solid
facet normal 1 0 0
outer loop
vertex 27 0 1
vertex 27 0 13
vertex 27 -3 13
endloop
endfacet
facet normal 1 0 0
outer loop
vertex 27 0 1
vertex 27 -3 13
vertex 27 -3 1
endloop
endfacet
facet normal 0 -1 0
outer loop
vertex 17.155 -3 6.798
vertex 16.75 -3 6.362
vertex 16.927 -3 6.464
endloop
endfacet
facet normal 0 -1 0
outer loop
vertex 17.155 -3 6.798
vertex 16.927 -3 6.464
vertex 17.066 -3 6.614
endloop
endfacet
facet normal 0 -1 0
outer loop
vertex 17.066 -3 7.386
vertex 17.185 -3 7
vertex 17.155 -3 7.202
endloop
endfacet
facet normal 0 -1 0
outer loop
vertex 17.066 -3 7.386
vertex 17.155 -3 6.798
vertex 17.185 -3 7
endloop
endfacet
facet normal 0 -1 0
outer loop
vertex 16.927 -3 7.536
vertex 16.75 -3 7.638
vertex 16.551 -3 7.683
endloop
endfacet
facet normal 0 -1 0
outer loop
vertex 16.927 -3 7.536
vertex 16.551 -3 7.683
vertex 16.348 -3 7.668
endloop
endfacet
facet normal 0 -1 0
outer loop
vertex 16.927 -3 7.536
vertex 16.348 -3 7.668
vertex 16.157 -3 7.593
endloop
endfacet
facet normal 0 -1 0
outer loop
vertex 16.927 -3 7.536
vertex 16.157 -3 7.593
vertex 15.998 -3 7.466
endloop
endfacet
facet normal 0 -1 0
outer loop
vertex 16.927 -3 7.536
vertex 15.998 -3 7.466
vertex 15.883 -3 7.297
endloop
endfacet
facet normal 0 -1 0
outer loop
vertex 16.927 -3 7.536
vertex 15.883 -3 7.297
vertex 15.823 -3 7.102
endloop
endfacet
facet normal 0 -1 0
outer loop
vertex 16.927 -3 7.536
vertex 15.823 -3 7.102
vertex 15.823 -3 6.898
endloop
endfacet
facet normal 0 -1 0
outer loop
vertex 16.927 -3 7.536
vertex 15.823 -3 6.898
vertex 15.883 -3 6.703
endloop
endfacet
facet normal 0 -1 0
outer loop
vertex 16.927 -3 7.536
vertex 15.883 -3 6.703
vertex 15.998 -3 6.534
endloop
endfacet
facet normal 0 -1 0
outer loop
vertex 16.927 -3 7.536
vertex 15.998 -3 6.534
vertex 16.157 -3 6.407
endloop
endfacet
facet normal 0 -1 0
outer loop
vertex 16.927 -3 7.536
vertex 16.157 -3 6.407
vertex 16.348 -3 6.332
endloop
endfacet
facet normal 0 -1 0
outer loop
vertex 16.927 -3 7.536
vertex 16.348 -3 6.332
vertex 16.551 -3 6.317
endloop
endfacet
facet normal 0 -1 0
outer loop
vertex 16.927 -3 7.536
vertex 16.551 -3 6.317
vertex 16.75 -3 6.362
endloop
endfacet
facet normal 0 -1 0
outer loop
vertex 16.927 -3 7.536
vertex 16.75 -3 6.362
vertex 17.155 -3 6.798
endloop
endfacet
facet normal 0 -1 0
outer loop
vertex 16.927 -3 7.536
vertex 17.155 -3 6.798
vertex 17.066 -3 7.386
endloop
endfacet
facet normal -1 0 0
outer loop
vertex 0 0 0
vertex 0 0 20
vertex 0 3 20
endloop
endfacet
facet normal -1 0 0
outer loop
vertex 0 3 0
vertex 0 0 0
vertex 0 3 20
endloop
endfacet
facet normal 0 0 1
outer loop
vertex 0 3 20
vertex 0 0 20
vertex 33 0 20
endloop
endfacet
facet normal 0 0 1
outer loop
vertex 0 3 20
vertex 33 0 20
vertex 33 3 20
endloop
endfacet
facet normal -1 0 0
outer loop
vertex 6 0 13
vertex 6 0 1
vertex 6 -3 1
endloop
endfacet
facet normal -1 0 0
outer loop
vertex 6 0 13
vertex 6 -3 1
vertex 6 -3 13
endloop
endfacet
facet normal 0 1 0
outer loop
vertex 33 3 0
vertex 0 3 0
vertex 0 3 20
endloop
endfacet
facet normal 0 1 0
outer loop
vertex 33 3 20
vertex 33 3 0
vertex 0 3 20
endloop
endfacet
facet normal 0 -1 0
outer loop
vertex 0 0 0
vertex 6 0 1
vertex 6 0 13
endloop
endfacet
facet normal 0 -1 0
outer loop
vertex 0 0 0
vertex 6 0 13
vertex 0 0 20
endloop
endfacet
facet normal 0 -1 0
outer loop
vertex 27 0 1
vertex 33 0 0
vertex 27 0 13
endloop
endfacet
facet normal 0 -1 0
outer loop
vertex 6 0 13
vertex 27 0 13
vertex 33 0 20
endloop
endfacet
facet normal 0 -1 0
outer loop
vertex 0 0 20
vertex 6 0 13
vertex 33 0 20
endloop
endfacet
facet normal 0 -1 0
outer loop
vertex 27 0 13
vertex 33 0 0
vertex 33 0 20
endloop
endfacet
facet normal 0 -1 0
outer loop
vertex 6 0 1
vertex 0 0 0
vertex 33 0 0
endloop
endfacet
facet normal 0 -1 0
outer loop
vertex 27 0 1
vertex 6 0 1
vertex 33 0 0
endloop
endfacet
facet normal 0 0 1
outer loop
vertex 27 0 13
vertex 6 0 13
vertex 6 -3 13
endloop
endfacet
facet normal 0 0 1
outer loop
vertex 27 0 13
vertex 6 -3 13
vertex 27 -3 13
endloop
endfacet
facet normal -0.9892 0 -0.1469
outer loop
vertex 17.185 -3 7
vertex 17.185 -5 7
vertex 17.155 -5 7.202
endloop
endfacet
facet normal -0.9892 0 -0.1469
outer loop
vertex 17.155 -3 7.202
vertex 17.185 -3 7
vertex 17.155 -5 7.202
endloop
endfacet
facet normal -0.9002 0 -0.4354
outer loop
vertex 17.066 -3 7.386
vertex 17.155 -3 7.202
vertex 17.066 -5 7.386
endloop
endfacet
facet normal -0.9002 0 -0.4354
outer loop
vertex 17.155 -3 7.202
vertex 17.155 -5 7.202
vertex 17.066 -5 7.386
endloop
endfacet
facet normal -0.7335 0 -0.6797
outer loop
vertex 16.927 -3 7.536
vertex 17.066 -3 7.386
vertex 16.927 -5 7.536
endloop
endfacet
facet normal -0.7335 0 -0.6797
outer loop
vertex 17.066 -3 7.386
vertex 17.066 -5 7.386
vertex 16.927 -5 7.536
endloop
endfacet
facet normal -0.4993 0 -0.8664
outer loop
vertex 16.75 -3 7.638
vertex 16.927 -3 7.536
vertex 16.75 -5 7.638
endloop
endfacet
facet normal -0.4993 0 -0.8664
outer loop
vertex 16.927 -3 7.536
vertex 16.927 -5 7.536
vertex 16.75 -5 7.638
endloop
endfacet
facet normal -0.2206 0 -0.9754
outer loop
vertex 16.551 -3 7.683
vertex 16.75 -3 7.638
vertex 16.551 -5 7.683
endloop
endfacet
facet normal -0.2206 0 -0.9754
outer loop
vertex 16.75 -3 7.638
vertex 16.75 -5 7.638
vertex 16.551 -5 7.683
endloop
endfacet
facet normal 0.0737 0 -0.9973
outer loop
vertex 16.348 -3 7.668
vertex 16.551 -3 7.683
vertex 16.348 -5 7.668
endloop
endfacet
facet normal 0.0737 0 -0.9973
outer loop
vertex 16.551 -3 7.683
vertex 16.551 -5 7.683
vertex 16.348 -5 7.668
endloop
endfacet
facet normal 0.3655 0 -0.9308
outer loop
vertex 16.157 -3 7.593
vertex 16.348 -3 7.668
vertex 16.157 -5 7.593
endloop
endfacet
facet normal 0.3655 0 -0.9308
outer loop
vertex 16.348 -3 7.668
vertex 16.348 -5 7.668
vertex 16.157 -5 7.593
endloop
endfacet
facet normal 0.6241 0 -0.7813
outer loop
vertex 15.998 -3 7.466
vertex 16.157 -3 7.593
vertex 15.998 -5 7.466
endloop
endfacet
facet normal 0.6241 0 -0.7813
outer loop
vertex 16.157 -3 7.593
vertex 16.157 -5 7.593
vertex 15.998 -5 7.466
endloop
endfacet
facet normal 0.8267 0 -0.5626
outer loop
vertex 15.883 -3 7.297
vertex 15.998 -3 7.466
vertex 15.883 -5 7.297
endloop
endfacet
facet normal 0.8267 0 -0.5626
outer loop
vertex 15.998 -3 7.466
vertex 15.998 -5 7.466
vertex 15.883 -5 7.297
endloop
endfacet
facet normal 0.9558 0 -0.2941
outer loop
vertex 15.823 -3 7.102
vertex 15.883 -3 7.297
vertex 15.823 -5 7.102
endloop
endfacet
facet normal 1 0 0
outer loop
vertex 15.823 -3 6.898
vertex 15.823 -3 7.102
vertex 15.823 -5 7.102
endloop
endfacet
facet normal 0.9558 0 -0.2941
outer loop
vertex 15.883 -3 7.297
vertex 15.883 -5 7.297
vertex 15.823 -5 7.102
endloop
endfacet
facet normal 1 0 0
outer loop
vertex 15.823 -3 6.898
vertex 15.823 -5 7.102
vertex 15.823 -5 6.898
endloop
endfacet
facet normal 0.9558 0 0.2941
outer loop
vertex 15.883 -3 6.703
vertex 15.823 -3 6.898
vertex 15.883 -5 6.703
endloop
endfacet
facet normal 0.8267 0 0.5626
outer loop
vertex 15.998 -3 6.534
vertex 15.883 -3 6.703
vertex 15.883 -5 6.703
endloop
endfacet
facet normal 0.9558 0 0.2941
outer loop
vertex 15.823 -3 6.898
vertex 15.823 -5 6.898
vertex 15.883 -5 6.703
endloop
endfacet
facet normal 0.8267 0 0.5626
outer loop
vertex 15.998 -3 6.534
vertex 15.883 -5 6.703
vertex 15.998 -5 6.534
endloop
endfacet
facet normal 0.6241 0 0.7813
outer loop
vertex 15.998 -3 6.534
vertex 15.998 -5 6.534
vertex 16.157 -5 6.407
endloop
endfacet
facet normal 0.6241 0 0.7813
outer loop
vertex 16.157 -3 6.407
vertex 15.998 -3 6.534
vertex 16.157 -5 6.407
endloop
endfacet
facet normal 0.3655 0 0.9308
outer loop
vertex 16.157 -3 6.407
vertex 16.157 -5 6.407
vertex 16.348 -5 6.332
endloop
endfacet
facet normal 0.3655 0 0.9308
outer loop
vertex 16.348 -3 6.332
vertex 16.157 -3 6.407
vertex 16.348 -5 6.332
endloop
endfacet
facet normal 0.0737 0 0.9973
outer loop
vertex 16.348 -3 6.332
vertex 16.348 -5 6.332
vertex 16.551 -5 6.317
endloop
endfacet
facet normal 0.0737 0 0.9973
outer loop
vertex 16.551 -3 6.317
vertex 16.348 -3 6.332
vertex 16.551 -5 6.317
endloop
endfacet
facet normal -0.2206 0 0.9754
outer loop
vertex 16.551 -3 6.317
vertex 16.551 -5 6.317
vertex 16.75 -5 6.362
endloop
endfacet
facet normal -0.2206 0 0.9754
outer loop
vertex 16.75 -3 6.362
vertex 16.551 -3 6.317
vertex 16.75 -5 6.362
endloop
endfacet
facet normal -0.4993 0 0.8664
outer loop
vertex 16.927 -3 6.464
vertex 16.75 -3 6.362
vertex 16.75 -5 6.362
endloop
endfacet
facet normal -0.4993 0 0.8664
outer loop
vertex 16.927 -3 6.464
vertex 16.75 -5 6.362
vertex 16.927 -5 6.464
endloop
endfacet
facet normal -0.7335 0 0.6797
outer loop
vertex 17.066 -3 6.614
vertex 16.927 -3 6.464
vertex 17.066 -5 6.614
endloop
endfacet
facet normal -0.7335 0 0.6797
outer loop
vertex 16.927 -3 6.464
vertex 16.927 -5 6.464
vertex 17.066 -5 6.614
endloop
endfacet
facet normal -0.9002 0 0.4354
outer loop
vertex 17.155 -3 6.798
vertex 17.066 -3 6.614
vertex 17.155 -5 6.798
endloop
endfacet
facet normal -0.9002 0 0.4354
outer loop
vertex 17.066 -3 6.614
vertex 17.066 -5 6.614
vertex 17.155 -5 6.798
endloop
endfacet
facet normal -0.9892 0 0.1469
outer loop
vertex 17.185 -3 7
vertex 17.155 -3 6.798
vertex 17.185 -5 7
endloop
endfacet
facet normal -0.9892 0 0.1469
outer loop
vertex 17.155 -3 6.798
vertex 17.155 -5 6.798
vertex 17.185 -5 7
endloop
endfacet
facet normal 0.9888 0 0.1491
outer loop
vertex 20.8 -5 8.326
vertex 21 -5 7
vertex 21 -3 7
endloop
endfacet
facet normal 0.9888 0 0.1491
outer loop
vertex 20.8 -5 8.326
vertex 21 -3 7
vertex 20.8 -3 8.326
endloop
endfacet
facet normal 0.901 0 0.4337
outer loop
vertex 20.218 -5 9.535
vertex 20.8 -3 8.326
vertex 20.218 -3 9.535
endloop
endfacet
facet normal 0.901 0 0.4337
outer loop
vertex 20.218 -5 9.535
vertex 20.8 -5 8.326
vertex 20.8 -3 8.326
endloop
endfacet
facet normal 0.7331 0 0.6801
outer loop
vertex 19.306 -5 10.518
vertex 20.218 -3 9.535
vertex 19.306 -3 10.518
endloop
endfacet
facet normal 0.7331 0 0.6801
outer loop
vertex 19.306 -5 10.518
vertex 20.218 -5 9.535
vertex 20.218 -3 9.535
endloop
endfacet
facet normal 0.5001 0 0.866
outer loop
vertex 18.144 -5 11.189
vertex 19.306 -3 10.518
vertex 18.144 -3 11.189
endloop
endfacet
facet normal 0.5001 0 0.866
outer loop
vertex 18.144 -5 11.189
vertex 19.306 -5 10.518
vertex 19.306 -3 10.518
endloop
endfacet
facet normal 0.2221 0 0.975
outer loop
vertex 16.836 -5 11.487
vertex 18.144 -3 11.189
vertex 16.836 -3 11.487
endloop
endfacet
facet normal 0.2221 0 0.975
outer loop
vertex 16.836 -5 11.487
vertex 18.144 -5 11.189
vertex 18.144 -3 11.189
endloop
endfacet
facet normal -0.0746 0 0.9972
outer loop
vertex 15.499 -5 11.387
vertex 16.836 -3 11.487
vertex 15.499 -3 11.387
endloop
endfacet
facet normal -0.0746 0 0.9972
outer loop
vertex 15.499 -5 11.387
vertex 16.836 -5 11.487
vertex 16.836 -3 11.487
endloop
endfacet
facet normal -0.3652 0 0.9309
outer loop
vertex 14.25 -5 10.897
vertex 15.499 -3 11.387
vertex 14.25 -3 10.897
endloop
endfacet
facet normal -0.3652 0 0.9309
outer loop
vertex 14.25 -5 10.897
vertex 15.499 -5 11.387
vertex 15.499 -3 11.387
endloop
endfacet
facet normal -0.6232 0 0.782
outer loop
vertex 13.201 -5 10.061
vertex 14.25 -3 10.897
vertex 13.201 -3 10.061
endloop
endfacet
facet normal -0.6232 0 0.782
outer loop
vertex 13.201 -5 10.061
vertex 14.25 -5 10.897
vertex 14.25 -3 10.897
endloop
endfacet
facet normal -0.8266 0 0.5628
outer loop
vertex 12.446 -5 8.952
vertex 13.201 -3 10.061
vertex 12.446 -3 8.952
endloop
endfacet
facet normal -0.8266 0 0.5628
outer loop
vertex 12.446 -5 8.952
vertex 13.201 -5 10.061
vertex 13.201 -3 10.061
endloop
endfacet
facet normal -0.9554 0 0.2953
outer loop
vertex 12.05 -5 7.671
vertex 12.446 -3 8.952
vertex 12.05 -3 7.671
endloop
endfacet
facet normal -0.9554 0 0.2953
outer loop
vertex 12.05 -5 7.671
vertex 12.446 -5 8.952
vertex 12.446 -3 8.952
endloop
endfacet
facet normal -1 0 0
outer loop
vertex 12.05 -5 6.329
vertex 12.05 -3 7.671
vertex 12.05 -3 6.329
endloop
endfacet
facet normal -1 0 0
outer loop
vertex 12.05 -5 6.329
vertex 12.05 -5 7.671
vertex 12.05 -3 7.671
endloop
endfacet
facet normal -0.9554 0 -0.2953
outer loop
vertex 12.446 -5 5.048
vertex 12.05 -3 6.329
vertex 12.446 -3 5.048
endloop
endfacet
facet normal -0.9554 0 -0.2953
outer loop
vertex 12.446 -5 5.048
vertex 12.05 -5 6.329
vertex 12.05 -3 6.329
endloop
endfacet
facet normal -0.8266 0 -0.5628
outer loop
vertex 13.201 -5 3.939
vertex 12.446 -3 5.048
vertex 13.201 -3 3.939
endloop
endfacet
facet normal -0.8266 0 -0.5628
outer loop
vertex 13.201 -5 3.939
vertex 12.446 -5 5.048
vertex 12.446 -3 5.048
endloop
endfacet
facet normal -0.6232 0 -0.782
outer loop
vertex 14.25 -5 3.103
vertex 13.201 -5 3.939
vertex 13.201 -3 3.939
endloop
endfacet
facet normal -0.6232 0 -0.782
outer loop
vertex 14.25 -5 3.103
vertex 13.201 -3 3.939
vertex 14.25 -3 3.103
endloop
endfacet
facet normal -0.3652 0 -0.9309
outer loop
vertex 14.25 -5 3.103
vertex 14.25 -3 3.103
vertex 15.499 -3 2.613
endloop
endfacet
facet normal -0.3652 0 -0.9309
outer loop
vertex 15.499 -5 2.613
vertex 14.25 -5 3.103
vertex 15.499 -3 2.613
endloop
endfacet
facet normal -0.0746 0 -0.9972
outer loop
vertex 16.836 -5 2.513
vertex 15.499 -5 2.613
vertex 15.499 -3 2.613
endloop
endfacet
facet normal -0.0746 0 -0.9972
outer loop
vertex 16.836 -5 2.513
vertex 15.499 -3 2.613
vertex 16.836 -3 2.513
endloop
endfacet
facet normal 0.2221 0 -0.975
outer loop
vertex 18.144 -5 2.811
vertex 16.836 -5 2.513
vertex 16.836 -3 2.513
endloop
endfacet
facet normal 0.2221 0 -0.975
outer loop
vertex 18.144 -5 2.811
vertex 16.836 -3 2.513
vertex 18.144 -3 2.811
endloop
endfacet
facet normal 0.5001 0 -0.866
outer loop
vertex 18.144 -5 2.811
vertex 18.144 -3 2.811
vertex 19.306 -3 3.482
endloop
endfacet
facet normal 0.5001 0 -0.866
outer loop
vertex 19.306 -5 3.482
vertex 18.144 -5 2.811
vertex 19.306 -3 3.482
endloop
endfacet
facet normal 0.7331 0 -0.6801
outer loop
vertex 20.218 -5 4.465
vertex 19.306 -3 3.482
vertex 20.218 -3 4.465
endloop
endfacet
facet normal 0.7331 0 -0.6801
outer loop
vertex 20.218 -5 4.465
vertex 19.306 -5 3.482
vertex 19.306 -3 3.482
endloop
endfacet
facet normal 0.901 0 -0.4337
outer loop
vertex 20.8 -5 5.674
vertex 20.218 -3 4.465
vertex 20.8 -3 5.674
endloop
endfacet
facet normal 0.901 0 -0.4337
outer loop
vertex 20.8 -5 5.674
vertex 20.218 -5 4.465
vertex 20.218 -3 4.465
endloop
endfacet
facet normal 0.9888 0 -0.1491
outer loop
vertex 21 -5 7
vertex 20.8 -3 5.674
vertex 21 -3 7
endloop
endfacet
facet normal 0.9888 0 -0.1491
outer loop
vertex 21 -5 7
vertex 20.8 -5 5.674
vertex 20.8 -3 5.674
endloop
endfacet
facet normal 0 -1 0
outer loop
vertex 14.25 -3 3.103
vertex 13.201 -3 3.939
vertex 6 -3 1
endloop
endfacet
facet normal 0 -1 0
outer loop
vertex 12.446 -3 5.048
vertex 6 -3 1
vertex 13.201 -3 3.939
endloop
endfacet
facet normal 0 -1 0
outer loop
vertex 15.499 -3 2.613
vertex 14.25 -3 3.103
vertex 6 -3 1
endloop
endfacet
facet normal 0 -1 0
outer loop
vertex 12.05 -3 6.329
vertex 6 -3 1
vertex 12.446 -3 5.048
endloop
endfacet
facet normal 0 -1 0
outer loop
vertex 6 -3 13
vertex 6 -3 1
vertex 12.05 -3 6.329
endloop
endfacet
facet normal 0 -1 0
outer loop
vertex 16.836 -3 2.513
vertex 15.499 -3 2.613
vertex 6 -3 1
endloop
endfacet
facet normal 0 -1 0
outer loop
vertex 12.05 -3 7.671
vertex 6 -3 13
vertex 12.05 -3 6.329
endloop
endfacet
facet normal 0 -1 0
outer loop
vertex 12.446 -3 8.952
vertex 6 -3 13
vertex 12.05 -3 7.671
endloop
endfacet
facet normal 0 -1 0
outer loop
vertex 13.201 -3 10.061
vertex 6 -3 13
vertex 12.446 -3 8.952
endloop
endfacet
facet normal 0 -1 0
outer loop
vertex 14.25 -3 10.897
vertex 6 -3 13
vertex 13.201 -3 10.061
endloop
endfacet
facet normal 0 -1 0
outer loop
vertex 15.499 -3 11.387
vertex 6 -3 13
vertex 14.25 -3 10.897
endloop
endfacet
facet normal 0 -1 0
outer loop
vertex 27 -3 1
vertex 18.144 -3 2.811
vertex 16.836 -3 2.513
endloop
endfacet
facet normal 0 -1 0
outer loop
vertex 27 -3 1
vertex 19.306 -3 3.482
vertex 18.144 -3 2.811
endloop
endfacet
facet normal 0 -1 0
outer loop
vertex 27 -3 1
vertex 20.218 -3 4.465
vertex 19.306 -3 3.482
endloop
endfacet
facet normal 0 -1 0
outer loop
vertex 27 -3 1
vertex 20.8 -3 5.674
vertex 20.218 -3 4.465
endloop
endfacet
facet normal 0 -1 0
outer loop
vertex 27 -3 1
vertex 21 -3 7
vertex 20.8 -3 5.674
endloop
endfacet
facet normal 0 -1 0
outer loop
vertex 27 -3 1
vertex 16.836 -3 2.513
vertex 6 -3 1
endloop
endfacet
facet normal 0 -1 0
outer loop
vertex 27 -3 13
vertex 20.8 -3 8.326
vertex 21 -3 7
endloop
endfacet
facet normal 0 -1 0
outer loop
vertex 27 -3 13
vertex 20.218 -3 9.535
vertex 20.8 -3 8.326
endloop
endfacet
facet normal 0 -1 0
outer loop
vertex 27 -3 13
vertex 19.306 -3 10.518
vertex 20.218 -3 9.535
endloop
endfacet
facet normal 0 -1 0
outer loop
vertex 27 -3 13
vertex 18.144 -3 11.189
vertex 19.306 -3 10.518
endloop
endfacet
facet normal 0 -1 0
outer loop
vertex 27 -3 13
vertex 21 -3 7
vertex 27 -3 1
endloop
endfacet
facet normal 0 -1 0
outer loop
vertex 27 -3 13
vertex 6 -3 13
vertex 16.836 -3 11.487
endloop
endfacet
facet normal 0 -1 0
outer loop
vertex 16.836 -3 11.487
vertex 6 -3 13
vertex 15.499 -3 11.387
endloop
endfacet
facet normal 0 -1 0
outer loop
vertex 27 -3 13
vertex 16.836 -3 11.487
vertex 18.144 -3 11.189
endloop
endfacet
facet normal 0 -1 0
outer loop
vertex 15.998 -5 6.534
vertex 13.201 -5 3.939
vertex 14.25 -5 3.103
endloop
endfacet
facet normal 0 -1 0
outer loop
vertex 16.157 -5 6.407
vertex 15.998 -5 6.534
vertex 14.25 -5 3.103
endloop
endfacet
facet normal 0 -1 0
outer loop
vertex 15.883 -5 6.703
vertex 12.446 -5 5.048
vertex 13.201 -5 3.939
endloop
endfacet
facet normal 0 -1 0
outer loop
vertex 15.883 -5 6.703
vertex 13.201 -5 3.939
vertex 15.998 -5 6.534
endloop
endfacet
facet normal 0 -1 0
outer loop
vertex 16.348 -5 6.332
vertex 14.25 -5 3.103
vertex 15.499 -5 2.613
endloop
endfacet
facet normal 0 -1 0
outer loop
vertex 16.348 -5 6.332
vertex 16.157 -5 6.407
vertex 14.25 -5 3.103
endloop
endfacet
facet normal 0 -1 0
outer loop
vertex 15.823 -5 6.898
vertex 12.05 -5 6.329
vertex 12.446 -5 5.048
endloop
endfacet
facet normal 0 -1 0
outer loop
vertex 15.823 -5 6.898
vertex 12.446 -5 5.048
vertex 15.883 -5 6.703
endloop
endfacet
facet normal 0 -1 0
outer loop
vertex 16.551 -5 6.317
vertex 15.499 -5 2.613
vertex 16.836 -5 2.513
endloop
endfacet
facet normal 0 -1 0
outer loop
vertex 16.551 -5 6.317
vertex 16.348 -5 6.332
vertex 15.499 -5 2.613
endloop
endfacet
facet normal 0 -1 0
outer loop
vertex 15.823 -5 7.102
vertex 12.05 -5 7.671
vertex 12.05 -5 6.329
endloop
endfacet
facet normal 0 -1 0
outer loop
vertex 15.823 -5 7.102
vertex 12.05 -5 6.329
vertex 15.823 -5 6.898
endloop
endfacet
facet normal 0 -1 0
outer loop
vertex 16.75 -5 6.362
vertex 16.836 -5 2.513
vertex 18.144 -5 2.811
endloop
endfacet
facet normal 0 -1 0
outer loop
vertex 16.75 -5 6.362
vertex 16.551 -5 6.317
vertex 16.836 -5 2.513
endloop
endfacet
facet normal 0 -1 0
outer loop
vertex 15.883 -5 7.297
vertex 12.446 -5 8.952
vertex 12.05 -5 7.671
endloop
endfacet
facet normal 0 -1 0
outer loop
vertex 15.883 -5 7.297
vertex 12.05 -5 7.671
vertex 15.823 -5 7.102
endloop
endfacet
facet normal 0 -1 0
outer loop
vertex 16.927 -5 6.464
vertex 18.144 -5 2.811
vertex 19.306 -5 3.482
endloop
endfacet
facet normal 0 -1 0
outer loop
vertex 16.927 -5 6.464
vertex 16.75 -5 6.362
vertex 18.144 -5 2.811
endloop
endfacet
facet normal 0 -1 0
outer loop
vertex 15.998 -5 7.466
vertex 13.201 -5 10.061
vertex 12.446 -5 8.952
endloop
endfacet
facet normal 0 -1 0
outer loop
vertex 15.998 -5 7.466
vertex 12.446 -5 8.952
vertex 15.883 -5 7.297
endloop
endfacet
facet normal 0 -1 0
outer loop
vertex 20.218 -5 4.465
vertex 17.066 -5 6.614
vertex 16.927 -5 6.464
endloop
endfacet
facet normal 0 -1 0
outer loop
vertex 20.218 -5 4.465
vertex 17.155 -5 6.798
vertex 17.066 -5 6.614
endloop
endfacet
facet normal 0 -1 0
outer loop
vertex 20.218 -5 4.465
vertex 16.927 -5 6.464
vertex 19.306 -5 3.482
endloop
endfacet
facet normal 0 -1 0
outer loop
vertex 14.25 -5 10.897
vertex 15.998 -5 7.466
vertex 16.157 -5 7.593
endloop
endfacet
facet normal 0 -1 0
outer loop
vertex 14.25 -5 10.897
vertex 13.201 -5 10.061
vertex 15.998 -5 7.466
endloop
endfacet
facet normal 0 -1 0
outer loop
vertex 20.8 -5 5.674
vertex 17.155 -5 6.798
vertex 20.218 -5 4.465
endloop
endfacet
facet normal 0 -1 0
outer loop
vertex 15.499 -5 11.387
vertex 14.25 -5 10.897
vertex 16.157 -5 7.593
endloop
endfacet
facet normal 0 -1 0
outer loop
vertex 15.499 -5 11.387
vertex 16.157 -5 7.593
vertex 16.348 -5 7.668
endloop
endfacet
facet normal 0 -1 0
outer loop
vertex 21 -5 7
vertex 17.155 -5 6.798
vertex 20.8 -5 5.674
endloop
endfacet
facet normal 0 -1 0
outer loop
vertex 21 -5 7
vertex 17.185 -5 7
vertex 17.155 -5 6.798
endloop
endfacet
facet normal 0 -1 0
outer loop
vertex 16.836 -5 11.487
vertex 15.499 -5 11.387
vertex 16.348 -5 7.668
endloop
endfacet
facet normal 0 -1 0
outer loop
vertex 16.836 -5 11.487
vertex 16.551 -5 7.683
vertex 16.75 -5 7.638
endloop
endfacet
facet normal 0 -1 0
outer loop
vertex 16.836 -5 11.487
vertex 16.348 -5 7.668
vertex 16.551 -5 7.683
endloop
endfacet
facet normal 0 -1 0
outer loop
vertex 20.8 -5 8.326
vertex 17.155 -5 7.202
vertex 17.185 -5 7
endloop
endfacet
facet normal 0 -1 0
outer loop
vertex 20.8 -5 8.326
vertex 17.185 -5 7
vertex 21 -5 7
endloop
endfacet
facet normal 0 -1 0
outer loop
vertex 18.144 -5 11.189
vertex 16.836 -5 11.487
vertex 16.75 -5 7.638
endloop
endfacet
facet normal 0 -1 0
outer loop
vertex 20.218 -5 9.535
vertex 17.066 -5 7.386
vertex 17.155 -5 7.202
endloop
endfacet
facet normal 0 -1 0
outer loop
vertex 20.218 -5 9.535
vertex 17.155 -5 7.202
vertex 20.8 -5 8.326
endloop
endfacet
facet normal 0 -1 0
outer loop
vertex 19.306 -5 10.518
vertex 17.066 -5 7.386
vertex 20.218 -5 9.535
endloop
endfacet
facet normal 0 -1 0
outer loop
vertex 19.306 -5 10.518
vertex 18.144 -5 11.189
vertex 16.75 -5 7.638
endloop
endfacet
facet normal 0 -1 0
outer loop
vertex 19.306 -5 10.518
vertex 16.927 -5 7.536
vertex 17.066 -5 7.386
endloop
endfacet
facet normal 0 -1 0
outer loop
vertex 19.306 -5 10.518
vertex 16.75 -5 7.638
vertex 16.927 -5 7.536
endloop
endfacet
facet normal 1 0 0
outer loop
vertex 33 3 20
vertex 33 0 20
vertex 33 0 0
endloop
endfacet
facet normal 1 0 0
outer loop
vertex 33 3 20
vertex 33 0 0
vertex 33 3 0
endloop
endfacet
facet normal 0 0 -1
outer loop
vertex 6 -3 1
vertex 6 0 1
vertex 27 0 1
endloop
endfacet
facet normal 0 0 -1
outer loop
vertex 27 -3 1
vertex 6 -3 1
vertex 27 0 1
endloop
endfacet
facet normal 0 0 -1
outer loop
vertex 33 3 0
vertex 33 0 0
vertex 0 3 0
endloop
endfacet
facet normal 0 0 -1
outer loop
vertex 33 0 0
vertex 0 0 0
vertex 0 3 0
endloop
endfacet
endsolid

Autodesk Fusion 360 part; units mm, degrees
box "BoxPrimitive1" add length 20 width 33 height 3 placed x (0, 0, 1) y (1, 0, 0) z (0, 1, 0) at (0, 0, 0)
sketch "Sketch2" plane through (0, 0, 0) normal (0, -1, 0) x (1, 0, 0)
  line L0 (33, 20) -> (0, 20)
  line L1 (0, 20) -> (0, 0)
  line L2 (0, 0) -> (33, 0)
  line L3 (33, 0) -> (33, 20)
  line L4 (16.5, 20) -> (16.5, 0)
  line L5 (16.5, 0) -> (16.5, 1)
  line L6 (16.5, 1) -> (27, 1)
  line L7 (27, 1) -> (6, 1)
  line L8 (6, 1) -> (6, 13)
  line L9 (6, 13) -> (27, 13)
  line L10 (27, 13) -> (27, 1)
  dimension "d6" = 1
  dimension "d7" = 10.5
  dimension "d8" = 21
  dimension "d9" = 12
extrude "Extrude1" add sketch "Sketch2" along normal blind 3 contours L4 L6 L7 L9 L10 | L4 L7 L8 L9
sketch "Sketch3" plane through (0, -3, 0) normal (0, -1, 0) x (1, 0, 0)
  line L0 (27, 13) -> (6, 13)
  line L1 (6, 13) -> (6, 1)
  line L2 (6, 1) -> (27, 1)
  line L3 (27, 1) -> (27, 13)
  line L4 (16.5, 13) -> (16.5, 1)
  line L5 (6, 7) -> (27, 7)
cylinder "CylinderPrimitive1" add diameter 9 height 2 placed x (1, 0, 0) y (0, 0, 1) z (0, -1, 0) at (16.5, -3, 7)
cylinder "CylinderPrimitive2" cut diameter 1.37 height -2 placed x (1, 0, 0) y (0, 0, 1) z (0, -1, 0) at (16.5, -5, 7)
